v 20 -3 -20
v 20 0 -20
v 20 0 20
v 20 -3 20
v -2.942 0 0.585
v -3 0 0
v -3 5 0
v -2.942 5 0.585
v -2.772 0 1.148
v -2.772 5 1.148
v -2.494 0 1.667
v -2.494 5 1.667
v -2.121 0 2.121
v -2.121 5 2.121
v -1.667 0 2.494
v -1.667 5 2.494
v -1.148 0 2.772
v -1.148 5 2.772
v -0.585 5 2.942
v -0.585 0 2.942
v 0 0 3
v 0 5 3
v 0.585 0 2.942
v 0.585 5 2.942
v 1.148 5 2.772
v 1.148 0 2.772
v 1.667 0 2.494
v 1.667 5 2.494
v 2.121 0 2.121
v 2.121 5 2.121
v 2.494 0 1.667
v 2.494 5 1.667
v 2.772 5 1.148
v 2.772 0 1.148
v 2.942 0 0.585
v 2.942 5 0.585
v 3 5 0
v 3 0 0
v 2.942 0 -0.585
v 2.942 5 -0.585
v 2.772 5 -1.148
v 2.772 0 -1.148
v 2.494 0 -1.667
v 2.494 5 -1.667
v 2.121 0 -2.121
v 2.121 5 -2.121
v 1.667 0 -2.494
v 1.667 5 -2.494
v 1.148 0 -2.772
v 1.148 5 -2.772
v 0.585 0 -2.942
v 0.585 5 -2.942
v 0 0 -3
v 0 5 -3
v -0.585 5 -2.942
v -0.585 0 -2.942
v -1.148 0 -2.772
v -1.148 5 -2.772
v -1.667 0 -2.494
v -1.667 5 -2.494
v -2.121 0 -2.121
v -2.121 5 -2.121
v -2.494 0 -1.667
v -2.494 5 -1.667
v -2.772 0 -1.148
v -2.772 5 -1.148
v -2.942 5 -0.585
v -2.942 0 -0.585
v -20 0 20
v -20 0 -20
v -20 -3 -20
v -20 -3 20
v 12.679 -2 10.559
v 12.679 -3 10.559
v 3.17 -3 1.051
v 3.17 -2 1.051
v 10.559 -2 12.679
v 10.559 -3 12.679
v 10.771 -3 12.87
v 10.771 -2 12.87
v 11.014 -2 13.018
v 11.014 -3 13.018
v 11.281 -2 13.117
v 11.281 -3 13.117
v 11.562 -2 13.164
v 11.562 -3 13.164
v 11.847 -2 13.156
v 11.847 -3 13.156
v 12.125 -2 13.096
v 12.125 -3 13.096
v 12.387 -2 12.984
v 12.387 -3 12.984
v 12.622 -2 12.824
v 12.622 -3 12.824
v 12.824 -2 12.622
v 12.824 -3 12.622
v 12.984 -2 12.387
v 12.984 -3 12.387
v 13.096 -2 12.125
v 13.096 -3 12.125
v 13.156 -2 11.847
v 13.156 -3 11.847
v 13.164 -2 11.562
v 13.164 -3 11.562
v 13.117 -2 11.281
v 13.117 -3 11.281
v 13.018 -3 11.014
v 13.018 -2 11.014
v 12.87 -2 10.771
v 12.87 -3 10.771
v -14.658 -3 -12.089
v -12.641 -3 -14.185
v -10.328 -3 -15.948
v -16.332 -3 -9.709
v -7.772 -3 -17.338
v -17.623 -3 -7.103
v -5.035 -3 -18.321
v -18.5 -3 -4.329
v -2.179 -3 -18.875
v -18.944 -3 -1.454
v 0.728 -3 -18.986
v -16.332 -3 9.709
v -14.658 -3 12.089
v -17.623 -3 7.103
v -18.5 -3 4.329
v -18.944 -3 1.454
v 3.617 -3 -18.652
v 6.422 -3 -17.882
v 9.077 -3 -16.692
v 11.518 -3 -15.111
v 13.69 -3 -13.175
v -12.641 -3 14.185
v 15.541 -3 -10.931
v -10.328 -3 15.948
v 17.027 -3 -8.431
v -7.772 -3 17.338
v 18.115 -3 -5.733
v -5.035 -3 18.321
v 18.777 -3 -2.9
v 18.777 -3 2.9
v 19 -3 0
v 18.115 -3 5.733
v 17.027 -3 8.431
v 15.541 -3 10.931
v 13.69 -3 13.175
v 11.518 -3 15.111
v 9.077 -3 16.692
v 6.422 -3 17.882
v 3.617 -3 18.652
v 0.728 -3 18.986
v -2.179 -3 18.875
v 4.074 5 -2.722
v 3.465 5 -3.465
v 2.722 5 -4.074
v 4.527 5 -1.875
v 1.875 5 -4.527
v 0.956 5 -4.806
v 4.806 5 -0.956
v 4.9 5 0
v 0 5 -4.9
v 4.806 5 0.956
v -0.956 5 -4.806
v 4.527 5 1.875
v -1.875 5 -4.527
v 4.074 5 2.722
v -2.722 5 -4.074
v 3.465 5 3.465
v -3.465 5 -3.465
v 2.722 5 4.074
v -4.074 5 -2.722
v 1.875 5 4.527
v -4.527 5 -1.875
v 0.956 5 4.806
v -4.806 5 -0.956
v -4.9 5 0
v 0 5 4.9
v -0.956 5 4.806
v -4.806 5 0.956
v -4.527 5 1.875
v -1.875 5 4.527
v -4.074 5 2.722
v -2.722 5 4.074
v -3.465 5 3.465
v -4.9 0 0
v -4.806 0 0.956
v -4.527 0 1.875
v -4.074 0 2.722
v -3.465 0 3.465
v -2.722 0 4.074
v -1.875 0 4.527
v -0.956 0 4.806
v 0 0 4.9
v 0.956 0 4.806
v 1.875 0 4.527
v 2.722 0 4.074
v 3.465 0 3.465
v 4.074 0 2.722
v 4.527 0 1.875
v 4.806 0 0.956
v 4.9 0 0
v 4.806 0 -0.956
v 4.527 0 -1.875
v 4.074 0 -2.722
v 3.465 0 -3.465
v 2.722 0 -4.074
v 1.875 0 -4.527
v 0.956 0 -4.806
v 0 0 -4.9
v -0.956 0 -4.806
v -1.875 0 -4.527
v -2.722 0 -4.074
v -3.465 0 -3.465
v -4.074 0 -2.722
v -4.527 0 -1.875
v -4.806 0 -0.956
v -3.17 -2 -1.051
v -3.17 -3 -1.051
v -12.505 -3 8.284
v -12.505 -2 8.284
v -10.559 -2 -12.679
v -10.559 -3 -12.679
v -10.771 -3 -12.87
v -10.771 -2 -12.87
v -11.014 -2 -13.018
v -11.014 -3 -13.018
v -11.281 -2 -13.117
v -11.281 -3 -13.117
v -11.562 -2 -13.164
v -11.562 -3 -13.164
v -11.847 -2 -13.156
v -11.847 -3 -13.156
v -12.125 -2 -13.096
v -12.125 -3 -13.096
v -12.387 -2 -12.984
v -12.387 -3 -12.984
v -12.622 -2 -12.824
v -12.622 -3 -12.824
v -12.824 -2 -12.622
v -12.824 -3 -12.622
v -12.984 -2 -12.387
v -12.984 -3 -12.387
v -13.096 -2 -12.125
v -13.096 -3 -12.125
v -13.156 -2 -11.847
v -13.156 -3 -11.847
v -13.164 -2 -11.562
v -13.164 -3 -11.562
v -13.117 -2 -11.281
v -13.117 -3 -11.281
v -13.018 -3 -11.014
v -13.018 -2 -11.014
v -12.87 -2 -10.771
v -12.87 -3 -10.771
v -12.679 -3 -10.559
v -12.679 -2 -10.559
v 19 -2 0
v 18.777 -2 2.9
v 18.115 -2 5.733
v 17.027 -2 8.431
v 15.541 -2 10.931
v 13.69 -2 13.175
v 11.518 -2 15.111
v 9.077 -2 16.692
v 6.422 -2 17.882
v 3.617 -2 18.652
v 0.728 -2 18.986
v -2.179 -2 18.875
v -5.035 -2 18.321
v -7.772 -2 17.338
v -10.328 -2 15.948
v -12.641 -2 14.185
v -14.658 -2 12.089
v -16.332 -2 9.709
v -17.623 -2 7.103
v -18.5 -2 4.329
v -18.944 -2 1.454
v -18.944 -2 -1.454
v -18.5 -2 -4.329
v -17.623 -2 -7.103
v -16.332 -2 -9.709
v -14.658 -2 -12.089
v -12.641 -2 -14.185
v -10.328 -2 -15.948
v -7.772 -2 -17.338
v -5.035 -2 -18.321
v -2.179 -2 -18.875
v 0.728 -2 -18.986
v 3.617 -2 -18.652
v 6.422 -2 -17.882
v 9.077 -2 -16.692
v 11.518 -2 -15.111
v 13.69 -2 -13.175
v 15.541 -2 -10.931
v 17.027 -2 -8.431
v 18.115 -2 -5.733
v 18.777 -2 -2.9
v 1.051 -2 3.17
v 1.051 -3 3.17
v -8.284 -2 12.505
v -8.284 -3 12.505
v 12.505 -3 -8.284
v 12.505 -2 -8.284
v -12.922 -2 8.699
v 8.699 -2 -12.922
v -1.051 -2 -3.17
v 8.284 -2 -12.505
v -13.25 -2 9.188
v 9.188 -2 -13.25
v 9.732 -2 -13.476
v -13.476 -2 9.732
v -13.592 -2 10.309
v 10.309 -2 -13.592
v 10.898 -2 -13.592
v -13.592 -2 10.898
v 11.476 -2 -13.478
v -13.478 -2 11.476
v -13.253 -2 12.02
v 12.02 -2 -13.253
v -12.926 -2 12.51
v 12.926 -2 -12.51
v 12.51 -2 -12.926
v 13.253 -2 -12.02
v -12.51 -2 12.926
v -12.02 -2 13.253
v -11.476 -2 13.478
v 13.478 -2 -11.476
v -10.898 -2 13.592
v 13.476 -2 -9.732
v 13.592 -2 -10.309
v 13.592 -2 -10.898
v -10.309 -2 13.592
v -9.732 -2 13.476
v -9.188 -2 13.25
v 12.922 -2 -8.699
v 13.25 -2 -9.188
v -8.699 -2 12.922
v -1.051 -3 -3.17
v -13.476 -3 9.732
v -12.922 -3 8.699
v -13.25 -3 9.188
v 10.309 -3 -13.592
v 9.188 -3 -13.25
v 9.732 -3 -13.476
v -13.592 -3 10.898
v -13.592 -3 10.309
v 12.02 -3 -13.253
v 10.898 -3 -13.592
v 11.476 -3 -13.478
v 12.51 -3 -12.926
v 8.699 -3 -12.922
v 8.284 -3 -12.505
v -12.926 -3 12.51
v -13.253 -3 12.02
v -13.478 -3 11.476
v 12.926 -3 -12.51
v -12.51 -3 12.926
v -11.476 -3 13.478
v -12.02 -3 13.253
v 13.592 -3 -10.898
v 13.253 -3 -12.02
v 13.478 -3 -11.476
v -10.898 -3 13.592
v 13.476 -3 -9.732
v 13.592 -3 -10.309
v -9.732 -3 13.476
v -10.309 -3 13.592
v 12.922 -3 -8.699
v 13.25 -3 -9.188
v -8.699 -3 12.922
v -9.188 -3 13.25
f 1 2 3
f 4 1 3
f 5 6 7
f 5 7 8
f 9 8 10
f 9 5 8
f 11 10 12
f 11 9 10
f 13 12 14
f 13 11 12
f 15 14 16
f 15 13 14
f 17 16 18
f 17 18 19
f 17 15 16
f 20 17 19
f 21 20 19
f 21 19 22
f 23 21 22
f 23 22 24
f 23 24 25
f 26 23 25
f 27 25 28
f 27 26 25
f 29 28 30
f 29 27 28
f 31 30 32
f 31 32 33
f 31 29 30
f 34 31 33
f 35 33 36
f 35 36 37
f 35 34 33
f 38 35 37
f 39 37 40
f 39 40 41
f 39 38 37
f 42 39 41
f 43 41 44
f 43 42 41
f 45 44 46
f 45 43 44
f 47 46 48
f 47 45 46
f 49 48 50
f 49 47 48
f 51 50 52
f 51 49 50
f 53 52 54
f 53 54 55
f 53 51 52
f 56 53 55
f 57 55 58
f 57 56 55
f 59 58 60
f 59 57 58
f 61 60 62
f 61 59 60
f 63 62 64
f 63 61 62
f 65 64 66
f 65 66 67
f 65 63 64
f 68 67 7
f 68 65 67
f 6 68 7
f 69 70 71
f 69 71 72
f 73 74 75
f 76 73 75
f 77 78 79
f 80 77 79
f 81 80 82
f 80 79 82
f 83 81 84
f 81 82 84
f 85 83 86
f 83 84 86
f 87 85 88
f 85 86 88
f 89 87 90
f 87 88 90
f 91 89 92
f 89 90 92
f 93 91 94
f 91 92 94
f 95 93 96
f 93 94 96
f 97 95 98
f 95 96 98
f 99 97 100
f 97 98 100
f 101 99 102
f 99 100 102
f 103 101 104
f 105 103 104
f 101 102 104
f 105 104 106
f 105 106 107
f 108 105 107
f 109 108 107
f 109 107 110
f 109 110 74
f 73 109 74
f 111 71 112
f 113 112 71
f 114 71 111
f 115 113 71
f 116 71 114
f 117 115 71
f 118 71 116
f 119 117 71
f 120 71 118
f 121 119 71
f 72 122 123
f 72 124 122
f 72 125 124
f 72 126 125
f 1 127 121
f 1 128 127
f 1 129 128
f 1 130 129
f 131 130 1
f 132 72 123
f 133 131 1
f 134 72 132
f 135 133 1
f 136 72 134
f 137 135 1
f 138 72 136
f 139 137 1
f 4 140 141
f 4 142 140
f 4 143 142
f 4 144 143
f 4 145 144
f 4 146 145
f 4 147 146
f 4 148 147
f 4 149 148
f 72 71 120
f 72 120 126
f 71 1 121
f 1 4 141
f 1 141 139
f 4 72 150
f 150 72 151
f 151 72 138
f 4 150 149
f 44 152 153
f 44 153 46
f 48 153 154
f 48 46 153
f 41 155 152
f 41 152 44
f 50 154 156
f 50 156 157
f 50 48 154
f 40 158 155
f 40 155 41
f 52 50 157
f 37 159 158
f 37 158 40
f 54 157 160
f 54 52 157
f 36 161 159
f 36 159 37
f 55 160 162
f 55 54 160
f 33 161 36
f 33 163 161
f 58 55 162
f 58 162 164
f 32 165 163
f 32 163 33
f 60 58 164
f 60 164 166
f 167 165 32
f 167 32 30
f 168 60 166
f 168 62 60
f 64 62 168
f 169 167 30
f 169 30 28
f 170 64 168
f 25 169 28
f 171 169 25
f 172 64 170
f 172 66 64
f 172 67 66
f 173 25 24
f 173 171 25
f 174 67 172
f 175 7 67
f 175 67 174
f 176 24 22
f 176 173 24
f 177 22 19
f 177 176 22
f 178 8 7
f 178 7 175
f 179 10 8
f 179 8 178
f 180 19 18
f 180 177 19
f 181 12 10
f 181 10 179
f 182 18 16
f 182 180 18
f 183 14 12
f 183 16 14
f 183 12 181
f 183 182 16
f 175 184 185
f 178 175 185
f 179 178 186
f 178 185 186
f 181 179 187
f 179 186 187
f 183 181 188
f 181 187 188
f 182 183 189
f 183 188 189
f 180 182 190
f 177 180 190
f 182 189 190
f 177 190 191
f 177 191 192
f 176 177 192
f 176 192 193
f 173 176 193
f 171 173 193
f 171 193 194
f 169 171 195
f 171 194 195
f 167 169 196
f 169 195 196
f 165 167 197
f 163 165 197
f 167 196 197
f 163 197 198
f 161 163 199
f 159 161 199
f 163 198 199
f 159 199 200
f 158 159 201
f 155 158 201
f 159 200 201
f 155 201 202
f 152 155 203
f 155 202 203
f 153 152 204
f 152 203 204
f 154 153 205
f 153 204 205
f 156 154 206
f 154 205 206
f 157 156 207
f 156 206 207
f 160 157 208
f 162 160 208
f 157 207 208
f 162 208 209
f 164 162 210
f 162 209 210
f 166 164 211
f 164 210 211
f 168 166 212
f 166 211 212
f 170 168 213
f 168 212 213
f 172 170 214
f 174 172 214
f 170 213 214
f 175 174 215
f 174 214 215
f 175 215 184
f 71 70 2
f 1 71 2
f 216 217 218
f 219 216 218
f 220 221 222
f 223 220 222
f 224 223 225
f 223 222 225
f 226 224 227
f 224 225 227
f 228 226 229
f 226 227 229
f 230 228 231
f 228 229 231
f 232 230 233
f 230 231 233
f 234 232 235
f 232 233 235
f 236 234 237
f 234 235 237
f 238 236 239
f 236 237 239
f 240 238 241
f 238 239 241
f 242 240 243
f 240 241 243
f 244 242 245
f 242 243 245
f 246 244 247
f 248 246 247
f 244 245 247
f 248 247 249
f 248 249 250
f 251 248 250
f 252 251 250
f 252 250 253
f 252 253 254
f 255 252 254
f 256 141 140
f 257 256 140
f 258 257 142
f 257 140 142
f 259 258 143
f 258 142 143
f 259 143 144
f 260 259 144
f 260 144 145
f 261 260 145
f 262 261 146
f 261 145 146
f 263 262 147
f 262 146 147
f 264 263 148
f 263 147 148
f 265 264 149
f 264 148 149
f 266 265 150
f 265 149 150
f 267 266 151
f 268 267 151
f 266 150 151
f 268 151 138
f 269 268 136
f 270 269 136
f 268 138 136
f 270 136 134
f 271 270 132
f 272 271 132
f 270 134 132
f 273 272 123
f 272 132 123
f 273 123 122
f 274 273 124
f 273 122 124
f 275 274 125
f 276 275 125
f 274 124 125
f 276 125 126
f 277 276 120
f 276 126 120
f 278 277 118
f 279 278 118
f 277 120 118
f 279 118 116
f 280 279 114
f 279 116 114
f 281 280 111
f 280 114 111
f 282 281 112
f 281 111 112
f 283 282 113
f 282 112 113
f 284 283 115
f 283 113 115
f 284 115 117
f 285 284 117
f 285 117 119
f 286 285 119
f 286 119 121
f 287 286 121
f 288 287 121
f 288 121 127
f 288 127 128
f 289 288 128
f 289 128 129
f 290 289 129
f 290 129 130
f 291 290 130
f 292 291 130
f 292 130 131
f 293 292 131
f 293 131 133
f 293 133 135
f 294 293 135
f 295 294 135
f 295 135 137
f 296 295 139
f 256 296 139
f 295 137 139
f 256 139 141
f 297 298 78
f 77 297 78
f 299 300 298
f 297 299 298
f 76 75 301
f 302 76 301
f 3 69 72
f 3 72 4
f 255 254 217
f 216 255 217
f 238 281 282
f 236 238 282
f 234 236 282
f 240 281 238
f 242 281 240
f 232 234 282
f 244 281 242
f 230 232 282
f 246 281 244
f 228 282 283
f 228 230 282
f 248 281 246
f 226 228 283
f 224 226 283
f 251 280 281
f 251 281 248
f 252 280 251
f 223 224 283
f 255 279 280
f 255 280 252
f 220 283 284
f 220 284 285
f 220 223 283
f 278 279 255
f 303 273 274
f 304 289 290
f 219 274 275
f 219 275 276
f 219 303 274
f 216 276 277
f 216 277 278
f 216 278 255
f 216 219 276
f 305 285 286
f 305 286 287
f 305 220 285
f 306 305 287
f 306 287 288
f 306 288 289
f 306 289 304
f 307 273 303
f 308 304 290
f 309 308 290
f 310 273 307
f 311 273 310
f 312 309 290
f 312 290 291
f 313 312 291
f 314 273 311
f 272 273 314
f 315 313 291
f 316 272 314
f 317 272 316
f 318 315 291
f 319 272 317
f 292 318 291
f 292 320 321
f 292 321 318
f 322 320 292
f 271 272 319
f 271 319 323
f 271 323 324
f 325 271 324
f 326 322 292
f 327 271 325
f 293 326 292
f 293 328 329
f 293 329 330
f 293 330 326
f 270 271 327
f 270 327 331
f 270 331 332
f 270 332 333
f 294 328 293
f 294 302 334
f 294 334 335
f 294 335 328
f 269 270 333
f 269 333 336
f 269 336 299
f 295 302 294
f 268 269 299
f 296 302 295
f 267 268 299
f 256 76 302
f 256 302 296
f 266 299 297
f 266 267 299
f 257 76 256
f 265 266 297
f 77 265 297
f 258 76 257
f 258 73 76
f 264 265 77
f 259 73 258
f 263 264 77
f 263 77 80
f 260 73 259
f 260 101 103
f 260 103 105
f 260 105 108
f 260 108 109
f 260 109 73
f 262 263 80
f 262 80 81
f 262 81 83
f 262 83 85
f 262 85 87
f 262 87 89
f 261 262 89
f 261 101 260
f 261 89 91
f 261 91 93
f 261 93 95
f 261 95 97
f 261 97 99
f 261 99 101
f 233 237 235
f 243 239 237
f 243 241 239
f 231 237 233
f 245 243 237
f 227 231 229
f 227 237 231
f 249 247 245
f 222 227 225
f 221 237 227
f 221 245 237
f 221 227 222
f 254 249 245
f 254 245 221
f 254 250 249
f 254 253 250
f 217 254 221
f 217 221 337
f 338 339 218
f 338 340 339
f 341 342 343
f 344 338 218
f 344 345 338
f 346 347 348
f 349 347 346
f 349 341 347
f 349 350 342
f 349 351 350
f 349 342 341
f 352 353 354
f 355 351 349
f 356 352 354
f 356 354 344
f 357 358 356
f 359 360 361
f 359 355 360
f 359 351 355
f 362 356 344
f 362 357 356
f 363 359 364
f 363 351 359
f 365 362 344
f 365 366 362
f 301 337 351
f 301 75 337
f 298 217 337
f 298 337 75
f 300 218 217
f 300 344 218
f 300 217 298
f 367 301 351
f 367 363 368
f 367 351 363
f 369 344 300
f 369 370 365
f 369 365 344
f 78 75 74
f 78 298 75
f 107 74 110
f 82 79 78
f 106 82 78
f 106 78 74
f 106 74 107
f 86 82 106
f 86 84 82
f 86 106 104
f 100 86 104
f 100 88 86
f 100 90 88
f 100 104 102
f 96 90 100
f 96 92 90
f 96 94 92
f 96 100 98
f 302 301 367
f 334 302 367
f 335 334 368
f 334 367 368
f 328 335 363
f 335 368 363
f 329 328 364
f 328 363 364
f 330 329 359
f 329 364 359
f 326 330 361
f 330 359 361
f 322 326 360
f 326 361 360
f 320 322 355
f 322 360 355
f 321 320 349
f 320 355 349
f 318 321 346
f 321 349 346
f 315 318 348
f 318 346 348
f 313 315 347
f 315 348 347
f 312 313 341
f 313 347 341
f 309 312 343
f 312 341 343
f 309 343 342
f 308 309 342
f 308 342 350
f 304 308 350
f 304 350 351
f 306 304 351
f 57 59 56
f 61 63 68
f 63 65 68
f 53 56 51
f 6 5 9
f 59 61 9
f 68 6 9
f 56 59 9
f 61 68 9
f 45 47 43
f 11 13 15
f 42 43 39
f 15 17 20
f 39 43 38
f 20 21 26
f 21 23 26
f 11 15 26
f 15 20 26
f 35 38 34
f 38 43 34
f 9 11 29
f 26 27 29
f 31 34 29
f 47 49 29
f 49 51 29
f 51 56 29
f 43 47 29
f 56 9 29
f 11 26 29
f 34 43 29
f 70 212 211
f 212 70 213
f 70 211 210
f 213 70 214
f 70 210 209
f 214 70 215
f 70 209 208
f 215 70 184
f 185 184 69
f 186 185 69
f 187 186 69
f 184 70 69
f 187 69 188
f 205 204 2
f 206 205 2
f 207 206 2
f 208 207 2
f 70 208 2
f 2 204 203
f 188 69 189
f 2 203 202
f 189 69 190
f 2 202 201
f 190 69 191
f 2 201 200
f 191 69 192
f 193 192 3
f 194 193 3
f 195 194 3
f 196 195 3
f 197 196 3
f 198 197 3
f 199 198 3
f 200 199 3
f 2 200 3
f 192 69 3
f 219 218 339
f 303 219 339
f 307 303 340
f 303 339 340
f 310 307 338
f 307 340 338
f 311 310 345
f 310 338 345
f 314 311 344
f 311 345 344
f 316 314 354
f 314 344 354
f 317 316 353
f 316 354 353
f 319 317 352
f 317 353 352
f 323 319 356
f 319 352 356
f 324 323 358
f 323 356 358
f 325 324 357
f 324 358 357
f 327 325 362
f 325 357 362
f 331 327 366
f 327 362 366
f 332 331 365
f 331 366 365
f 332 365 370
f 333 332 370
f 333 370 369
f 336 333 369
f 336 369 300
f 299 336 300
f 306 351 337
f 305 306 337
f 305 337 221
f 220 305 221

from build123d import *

# Parameters (mm, degrees)
F0_W     = 40
F0_H     = 40
F1_DEPTH = 3
F2_R     = 4.9
F2_R_2   = 3
F3_DEPTH = 5
F4_R     = 19
F5_DEPTH = 1


with BuildPart() as f1:
    # F0 (on Front) → F1 (new body)
    with BuildSketch(Plane.XZ):
        Rectangle(F0_W, F0_H)
    extrude(amount=F1_DEPTH)

    # F2 (on face) → F3 (join)
    with BuildSketch(Plane(origin=(0, 0, 0), x_dir=(-1, 0, 0), z_dir=(0, 1, 0))):
        Circle(F2_R)
        Circle(F2_R_2, mode=Mode.SUBTRACT)
    extrude(amount=F3_DEPTH)

    # F4 (on face) → F5 (cut)
    with BuildSketch(Plane.XZ.offset(3)):
        Circle(F4_R)
        with BuildLine():
            ThreePointArc((-12.505157, 8.283783), (-12.727922, 12.727922), (-8.283783, 12.505157))
            Line((-8.283783, 12.505157), (1.051123, 3.170251))
            Line((1.051123, 3.170251), (10.559486, 12.678614))
            ThreePointArc((10.559486, 12.678614), (12.727922, 12.727922), (12.678614, 10.559486))
            Line((12.678614, 10.559486), (3.170251, 1.051123))
            Line((3.170251, 1.051123), (12.505157, -8.283783))
            ThreePointArc((12.505157, -8.283783), (12.727922, -12.727922), (8.283783, -12.505157))
            Line((8.283783, -12.505157), (-1.051123, -3.170251))
            Line((-1.051123, -3.170251), (-10.559486, -12.678614))
            ThreePointArc((-10.559486, -12.678614), (-12.727922, -12.727922), (-12.678614, -10.559486))
            Line((-12.678614, -10.559486), (-3.170251, -1.051123))
            Line((-3.170251, -1.051123), (-12.505157, 8.283783))
        make_face(mode=Mode.SUBTRACT)
    extrude(amount=-F5_DEPTH, mode=Mode.SUBTRACT)


solid = f1.part
